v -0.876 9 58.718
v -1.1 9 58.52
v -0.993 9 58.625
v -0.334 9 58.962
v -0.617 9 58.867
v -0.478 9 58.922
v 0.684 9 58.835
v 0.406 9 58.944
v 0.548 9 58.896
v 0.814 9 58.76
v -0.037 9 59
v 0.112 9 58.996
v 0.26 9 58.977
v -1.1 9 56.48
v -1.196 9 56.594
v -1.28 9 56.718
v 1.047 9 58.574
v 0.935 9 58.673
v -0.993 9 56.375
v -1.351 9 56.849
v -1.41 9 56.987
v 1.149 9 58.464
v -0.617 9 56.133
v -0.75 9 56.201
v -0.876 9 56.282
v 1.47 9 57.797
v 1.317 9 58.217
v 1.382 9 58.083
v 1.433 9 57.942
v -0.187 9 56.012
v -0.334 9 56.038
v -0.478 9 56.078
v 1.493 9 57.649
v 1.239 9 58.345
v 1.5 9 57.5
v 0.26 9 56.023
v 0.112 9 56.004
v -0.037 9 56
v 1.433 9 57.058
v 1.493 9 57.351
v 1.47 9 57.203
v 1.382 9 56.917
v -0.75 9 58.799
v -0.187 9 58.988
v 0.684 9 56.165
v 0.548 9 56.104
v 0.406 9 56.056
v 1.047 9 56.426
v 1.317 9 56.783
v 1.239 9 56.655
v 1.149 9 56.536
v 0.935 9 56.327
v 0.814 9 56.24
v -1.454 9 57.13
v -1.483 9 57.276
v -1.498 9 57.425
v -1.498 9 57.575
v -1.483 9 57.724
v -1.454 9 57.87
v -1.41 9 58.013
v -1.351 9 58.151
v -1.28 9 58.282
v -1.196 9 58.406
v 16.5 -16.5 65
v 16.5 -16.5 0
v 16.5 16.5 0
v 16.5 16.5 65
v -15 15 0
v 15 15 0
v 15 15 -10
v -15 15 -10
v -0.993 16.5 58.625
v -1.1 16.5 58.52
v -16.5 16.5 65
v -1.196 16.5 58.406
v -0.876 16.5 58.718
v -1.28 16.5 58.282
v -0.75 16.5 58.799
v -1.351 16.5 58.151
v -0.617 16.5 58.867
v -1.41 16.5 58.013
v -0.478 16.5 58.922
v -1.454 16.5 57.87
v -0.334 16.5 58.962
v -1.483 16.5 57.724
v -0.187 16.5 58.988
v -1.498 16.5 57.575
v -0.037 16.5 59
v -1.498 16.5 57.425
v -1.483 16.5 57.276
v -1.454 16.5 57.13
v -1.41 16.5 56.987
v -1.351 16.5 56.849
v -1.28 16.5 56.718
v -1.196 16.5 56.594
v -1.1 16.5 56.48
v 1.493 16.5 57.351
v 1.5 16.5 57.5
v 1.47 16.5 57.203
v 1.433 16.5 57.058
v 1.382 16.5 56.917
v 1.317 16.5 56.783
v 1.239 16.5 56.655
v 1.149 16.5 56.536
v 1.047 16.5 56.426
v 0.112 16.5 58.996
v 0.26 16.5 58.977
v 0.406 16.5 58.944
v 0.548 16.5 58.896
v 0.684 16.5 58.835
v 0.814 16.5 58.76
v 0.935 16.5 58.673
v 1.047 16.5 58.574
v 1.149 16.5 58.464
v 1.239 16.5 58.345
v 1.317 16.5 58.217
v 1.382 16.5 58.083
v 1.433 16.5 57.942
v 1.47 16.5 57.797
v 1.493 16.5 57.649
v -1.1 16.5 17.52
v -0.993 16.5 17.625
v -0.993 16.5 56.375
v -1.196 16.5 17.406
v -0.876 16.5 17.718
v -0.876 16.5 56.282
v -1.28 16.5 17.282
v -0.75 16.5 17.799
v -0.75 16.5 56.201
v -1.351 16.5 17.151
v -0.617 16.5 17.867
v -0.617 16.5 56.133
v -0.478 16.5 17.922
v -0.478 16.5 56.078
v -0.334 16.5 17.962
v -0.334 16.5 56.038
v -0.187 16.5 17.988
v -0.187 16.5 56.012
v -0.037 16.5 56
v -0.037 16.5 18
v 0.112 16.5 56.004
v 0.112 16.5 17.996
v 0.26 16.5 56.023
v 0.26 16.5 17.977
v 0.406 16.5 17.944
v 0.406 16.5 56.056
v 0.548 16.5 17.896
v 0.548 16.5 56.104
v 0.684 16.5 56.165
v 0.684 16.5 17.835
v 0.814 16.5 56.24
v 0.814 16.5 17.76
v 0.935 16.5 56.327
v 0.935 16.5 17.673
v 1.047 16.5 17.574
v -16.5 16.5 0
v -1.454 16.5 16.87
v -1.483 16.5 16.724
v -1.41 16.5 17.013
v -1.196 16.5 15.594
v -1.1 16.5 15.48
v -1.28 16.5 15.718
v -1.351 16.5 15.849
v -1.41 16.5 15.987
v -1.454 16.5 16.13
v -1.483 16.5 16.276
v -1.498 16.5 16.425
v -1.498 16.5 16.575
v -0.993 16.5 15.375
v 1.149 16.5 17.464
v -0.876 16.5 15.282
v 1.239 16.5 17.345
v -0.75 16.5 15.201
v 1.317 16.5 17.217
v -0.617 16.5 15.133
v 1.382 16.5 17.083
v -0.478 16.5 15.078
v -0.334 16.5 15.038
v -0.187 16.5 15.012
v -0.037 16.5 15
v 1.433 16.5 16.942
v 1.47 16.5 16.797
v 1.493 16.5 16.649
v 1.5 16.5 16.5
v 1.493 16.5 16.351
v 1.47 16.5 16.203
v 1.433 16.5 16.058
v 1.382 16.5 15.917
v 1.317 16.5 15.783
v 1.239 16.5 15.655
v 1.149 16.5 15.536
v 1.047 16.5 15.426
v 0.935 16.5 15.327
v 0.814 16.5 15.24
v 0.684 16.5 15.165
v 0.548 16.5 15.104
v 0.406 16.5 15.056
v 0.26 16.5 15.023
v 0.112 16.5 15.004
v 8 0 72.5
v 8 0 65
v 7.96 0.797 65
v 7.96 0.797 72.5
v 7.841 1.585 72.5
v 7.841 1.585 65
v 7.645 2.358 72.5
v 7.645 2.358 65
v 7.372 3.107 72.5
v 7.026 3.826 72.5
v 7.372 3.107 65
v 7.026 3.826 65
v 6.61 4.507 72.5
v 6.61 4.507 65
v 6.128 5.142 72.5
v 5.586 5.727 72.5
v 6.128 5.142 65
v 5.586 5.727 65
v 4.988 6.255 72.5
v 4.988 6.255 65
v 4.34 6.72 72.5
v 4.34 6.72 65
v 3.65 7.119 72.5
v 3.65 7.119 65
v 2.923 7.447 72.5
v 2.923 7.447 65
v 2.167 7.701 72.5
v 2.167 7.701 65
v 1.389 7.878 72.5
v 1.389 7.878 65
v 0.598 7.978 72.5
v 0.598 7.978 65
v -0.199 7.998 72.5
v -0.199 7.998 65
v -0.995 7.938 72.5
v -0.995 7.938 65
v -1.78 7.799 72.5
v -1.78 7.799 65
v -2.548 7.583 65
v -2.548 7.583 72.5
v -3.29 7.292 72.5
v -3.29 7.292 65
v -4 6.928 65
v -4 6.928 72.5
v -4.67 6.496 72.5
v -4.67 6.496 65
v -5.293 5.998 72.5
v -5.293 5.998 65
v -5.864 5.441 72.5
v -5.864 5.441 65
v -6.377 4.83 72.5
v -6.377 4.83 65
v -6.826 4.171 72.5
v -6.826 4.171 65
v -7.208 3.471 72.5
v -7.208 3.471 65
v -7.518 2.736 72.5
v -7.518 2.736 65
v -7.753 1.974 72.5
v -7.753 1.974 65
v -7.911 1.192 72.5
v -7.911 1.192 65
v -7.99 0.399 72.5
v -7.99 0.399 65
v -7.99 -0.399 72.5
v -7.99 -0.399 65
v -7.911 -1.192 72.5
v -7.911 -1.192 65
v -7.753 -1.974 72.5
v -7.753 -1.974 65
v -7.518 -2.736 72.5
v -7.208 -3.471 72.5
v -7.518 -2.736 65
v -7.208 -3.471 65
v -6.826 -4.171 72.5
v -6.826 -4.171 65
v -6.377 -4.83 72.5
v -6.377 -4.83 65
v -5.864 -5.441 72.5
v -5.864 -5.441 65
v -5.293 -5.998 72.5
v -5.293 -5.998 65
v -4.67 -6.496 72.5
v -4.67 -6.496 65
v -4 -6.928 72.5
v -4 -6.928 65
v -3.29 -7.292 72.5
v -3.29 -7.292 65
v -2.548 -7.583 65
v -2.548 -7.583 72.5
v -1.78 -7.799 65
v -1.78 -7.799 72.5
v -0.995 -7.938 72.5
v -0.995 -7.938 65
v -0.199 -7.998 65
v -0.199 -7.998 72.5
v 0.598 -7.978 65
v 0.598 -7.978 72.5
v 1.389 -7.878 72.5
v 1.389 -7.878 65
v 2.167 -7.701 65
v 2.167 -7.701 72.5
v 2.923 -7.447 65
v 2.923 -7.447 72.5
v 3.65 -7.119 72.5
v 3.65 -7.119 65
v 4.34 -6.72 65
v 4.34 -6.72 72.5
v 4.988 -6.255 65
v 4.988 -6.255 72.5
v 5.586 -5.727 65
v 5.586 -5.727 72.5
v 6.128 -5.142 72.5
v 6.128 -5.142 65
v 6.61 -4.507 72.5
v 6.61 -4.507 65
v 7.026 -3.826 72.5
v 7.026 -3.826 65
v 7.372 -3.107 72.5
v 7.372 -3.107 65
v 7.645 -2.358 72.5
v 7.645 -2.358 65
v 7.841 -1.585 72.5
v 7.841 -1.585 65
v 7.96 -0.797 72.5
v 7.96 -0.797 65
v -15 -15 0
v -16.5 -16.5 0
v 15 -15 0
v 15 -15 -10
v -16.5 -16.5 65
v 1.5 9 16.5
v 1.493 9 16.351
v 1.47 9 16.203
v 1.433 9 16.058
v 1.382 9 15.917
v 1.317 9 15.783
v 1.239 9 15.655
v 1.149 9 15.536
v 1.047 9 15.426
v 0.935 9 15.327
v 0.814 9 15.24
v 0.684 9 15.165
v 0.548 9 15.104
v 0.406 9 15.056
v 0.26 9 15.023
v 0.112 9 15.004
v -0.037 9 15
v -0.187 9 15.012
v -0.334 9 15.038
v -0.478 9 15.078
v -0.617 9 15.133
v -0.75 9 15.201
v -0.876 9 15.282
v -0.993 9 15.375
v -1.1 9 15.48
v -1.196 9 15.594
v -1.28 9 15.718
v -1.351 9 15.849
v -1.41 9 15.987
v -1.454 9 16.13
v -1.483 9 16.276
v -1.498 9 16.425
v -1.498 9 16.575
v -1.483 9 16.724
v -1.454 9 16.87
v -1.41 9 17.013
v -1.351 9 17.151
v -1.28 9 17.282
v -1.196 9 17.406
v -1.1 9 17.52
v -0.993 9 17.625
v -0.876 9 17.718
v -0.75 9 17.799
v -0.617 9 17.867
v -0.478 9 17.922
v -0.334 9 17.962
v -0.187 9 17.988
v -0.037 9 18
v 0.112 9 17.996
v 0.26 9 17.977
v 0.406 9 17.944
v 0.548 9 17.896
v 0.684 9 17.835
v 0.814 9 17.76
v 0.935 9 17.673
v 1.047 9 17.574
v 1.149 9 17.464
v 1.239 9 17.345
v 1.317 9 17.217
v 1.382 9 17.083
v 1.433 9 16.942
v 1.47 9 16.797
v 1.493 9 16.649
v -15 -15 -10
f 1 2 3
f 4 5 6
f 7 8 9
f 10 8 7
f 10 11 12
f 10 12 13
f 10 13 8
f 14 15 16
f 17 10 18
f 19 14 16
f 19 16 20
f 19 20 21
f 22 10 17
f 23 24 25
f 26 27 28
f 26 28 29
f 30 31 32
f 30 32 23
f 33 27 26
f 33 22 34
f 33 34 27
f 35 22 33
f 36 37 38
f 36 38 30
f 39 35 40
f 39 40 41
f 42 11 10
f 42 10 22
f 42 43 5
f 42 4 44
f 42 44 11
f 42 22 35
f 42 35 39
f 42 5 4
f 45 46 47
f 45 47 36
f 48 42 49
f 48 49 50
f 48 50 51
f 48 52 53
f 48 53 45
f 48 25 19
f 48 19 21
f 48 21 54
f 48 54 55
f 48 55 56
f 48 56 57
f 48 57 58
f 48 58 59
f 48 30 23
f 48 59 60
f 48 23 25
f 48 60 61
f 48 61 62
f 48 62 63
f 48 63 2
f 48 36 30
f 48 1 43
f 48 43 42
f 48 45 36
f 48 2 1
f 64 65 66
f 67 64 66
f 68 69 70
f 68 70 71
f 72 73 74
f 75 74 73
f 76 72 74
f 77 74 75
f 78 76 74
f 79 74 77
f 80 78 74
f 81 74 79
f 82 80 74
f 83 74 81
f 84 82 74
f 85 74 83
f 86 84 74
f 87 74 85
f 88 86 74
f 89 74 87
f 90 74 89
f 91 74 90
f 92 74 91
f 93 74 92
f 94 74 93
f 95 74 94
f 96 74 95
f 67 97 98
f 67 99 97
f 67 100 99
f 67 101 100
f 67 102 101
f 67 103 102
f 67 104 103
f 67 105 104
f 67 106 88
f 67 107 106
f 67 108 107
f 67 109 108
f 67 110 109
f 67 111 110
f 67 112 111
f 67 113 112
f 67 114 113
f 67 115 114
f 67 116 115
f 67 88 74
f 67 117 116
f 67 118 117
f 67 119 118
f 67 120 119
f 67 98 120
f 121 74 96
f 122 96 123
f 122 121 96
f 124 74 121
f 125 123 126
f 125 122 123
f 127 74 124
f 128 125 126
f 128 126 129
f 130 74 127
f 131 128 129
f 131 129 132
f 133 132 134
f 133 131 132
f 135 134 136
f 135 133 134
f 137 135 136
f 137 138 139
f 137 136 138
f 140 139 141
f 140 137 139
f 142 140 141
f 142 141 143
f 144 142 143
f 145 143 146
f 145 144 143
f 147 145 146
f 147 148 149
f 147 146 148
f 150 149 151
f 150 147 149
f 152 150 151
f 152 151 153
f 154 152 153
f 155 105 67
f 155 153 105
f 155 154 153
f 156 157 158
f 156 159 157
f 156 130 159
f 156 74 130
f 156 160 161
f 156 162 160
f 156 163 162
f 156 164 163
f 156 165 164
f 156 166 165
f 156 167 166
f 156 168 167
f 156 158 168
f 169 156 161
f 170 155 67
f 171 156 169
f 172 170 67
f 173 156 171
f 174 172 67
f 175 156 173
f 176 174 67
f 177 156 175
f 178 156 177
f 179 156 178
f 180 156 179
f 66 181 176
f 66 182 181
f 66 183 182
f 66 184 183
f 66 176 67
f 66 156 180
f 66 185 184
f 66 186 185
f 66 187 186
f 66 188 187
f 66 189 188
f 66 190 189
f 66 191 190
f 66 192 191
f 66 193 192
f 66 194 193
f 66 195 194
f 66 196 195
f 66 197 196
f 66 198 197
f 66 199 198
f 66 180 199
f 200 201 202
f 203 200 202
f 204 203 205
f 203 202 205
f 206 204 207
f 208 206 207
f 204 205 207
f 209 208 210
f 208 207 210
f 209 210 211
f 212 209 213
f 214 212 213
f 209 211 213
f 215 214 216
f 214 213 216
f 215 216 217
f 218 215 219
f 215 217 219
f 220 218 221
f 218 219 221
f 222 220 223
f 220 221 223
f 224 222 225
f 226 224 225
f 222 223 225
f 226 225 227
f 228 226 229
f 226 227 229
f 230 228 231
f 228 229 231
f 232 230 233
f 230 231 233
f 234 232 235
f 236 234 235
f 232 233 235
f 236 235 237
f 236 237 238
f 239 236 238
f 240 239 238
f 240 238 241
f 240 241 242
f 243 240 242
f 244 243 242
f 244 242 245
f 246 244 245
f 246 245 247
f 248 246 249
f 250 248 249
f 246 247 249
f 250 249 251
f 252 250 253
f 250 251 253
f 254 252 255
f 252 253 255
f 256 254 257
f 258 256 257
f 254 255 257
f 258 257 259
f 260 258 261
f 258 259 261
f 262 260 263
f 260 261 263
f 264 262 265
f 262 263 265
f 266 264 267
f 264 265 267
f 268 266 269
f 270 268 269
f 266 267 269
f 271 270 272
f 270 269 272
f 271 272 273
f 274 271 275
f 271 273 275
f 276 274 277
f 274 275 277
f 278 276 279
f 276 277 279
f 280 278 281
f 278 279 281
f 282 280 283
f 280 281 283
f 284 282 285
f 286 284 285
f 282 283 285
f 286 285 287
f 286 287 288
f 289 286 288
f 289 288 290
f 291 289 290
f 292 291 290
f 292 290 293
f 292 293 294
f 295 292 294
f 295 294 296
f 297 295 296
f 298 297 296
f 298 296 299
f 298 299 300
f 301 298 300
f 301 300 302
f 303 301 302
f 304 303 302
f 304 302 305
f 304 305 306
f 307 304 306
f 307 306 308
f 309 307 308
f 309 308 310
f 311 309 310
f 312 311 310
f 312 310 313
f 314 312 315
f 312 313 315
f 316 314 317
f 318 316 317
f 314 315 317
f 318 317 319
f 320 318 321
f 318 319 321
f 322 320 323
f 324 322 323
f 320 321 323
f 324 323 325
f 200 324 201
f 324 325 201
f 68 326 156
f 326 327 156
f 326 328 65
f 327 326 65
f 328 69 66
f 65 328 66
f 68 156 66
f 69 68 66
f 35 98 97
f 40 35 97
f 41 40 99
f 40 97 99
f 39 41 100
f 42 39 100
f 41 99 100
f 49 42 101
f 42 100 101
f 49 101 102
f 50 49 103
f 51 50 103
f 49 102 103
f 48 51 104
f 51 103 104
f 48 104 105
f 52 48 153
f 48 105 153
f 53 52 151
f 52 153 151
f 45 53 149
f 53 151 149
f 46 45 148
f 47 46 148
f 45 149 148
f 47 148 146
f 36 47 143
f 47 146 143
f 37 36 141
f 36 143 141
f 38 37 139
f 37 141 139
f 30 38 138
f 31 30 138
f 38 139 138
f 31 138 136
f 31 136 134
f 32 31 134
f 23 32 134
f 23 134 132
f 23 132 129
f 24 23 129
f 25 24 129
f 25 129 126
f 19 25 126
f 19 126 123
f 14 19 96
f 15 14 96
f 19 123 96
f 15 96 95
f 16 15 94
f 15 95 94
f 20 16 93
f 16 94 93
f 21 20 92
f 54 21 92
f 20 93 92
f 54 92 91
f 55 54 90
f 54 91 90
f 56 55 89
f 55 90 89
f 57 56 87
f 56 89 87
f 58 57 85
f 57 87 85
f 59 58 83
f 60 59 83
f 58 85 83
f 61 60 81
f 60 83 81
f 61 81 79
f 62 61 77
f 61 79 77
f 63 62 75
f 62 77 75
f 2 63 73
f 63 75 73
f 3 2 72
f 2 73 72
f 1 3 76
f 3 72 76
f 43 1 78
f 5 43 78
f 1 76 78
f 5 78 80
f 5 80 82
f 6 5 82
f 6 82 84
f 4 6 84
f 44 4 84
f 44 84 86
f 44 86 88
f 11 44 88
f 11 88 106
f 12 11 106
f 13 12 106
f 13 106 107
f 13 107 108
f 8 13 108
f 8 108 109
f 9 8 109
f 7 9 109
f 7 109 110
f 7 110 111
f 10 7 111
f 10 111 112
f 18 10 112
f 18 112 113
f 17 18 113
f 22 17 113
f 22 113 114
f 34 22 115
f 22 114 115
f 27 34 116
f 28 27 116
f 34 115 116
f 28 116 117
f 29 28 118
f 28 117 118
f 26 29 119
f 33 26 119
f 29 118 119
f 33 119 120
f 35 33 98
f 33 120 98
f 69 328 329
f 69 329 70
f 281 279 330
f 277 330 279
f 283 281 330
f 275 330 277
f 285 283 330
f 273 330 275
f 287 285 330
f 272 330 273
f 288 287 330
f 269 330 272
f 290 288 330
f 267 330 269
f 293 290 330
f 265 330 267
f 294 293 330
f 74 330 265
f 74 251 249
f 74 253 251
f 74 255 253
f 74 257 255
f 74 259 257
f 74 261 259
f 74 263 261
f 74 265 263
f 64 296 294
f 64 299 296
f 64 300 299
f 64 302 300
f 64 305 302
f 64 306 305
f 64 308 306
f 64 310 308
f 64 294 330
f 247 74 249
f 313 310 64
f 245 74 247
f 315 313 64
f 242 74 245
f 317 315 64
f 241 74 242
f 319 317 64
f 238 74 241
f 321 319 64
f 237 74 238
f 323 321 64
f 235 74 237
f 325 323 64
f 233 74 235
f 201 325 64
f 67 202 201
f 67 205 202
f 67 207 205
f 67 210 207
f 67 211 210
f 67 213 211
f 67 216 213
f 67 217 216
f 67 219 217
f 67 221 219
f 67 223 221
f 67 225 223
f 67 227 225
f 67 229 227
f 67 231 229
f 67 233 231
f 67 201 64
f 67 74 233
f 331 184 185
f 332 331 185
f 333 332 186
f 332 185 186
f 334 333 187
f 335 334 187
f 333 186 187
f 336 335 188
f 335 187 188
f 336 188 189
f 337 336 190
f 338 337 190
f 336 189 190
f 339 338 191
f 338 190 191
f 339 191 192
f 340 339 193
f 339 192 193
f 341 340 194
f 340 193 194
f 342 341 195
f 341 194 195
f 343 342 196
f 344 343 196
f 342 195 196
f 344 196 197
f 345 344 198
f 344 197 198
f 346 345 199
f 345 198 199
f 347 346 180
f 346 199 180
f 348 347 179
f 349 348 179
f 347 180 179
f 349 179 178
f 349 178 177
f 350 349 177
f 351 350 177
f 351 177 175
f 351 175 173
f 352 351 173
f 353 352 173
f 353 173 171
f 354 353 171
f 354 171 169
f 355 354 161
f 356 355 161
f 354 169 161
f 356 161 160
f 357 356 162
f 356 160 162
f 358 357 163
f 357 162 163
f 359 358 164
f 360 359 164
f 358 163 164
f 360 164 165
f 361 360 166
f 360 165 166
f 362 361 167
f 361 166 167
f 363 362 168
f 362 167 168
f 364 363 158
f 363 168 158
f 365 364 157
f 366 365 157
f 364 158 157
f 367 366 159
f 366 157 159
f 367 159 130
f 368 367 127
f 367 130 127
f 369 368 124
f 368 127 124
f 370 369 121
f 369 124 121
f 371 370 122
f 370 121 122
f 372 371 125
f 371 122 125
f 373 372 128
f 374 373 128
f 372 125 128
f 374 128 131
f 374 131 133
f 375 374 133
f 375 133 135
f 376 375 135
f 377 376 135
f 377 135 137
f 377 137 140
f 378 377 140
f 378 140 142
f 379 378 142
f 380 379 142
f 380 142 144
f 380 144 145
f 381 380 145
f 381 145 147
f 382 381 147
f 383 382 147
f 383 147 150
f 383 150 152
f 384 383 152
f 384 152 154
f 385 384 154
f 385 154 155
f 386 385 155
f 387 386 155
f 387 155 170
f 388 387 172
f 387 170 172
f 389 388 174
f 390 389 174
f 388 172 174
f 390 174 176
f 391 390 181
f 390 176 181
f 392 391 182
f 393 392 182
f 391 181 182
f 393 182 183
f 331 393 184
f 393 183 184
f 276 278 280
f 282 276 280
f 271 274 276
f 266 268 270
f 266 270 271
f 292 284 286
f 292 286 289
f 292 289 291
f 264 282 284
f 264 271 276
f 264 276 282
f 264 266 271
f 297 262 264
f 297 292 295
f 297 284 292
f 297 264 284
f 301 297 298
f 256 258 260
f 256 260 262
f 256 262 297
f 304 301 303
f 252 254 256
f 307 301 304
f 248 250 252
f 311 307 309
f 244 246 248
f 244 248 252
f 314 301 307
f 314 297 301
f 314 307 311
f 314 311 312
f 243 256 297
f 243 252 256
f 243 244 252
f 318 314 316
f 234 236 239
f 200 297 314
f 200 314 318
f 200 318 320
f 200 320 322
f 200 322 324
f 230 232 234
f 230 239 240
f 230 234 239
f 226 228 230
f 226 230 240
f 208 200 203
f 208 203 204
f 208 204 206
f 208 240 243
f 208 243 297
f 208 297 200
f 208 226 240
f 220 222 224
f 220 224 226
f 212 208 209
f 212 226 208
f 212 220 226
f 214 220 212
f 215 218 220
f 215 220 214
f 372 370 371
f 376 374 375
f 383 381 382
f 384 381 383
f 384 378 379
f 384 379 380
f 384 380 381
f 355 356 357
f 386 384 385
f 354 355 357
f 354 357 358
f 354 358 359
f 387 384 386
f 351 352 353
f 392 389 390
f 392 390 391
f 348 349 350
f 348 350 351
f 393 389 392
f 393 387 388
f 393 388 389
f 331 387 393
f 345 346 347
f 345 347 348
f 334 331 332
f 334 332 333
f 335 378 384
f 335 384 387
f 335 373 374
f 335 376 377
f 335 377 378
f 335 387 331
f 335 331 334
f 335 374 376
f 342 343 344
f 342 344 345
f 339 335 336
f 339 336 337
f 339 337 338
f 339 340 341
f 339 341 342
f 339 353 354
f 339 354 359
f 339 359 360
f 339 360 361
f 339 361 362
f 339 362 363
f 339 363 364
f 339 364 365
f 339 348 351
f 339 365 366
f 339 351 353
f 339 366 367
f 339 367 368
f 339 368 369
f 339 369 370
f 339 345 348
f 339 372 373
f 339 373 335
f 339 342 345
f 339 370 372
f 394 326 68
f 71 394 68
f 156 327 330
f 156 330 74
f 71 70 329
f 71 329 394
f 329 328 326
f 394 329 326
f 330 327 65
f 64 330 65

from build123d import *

# Parameters (mm, degrees)
ESBO_O1_W                = 33
ESBO_O1_H                = 33
RESSALTO_EXTRUS_O1_DEPTH = 65
ESBO_O2_W                = 30
ESBO_O2_H                = 30
RESSALTO_EXTRUS_O2_DEPTH = 10
ESBO_O3_R                = 8
RESSALTO_EXTRUS_O3_DEPTH = 7.5
ESBO_O4_R                = 1.5
CORTE_EXTRUS_O1_DEPTH    = 7.5


with BuildPart() as part:
    # Esboço1 → Ressalto-extrusão1 (new body)
    with BuildSketch(Plane.XY):
        Rectangle(ESBO_O1_W, ESBO_O1_H)
    extrude(amount=RESSALTO_EXTRUS_O1_DEPTH)

    # Esboço2 → Ressalto-extrusão2 (add)
    with BuildSketch(Plane(origin=(0, 0, 0), x_dir=(-1, 0, 0), z_dir=(0, 0, -1))):
        Rectangle(ESBO_O2_W, ESBO_O2_H)
    extrude(amount=RESSALTO_EXTRUS_O2_DEPTH)

    # Esboço3 → Ressalto-extrusão3 (add)
    with BuildSketch(Plane.XY.offset(65)):
        Circle(ESBO_O3_R)
    extrude(amount=RESSALTO_EXTRUS_O3_DEPTH)

    # Esboço4 → Corte-extrusão1 (cut)
    with BuildSketch(Plane(origin=(0, 16.5, 0), x_dir=(1, 0, 0), z_dir=(0, 1, 0))):
        with Locations((0, -16.5)):
            Circle(ESBO_O4_R)
        with Locations((0, -57.5)):
            Circle(ESBO_O4_R)
    extrude(amount=-CORTE_EXTRUS_O1_DEPTH, mode=Mode.SUBTRACT)


solid = part.part
